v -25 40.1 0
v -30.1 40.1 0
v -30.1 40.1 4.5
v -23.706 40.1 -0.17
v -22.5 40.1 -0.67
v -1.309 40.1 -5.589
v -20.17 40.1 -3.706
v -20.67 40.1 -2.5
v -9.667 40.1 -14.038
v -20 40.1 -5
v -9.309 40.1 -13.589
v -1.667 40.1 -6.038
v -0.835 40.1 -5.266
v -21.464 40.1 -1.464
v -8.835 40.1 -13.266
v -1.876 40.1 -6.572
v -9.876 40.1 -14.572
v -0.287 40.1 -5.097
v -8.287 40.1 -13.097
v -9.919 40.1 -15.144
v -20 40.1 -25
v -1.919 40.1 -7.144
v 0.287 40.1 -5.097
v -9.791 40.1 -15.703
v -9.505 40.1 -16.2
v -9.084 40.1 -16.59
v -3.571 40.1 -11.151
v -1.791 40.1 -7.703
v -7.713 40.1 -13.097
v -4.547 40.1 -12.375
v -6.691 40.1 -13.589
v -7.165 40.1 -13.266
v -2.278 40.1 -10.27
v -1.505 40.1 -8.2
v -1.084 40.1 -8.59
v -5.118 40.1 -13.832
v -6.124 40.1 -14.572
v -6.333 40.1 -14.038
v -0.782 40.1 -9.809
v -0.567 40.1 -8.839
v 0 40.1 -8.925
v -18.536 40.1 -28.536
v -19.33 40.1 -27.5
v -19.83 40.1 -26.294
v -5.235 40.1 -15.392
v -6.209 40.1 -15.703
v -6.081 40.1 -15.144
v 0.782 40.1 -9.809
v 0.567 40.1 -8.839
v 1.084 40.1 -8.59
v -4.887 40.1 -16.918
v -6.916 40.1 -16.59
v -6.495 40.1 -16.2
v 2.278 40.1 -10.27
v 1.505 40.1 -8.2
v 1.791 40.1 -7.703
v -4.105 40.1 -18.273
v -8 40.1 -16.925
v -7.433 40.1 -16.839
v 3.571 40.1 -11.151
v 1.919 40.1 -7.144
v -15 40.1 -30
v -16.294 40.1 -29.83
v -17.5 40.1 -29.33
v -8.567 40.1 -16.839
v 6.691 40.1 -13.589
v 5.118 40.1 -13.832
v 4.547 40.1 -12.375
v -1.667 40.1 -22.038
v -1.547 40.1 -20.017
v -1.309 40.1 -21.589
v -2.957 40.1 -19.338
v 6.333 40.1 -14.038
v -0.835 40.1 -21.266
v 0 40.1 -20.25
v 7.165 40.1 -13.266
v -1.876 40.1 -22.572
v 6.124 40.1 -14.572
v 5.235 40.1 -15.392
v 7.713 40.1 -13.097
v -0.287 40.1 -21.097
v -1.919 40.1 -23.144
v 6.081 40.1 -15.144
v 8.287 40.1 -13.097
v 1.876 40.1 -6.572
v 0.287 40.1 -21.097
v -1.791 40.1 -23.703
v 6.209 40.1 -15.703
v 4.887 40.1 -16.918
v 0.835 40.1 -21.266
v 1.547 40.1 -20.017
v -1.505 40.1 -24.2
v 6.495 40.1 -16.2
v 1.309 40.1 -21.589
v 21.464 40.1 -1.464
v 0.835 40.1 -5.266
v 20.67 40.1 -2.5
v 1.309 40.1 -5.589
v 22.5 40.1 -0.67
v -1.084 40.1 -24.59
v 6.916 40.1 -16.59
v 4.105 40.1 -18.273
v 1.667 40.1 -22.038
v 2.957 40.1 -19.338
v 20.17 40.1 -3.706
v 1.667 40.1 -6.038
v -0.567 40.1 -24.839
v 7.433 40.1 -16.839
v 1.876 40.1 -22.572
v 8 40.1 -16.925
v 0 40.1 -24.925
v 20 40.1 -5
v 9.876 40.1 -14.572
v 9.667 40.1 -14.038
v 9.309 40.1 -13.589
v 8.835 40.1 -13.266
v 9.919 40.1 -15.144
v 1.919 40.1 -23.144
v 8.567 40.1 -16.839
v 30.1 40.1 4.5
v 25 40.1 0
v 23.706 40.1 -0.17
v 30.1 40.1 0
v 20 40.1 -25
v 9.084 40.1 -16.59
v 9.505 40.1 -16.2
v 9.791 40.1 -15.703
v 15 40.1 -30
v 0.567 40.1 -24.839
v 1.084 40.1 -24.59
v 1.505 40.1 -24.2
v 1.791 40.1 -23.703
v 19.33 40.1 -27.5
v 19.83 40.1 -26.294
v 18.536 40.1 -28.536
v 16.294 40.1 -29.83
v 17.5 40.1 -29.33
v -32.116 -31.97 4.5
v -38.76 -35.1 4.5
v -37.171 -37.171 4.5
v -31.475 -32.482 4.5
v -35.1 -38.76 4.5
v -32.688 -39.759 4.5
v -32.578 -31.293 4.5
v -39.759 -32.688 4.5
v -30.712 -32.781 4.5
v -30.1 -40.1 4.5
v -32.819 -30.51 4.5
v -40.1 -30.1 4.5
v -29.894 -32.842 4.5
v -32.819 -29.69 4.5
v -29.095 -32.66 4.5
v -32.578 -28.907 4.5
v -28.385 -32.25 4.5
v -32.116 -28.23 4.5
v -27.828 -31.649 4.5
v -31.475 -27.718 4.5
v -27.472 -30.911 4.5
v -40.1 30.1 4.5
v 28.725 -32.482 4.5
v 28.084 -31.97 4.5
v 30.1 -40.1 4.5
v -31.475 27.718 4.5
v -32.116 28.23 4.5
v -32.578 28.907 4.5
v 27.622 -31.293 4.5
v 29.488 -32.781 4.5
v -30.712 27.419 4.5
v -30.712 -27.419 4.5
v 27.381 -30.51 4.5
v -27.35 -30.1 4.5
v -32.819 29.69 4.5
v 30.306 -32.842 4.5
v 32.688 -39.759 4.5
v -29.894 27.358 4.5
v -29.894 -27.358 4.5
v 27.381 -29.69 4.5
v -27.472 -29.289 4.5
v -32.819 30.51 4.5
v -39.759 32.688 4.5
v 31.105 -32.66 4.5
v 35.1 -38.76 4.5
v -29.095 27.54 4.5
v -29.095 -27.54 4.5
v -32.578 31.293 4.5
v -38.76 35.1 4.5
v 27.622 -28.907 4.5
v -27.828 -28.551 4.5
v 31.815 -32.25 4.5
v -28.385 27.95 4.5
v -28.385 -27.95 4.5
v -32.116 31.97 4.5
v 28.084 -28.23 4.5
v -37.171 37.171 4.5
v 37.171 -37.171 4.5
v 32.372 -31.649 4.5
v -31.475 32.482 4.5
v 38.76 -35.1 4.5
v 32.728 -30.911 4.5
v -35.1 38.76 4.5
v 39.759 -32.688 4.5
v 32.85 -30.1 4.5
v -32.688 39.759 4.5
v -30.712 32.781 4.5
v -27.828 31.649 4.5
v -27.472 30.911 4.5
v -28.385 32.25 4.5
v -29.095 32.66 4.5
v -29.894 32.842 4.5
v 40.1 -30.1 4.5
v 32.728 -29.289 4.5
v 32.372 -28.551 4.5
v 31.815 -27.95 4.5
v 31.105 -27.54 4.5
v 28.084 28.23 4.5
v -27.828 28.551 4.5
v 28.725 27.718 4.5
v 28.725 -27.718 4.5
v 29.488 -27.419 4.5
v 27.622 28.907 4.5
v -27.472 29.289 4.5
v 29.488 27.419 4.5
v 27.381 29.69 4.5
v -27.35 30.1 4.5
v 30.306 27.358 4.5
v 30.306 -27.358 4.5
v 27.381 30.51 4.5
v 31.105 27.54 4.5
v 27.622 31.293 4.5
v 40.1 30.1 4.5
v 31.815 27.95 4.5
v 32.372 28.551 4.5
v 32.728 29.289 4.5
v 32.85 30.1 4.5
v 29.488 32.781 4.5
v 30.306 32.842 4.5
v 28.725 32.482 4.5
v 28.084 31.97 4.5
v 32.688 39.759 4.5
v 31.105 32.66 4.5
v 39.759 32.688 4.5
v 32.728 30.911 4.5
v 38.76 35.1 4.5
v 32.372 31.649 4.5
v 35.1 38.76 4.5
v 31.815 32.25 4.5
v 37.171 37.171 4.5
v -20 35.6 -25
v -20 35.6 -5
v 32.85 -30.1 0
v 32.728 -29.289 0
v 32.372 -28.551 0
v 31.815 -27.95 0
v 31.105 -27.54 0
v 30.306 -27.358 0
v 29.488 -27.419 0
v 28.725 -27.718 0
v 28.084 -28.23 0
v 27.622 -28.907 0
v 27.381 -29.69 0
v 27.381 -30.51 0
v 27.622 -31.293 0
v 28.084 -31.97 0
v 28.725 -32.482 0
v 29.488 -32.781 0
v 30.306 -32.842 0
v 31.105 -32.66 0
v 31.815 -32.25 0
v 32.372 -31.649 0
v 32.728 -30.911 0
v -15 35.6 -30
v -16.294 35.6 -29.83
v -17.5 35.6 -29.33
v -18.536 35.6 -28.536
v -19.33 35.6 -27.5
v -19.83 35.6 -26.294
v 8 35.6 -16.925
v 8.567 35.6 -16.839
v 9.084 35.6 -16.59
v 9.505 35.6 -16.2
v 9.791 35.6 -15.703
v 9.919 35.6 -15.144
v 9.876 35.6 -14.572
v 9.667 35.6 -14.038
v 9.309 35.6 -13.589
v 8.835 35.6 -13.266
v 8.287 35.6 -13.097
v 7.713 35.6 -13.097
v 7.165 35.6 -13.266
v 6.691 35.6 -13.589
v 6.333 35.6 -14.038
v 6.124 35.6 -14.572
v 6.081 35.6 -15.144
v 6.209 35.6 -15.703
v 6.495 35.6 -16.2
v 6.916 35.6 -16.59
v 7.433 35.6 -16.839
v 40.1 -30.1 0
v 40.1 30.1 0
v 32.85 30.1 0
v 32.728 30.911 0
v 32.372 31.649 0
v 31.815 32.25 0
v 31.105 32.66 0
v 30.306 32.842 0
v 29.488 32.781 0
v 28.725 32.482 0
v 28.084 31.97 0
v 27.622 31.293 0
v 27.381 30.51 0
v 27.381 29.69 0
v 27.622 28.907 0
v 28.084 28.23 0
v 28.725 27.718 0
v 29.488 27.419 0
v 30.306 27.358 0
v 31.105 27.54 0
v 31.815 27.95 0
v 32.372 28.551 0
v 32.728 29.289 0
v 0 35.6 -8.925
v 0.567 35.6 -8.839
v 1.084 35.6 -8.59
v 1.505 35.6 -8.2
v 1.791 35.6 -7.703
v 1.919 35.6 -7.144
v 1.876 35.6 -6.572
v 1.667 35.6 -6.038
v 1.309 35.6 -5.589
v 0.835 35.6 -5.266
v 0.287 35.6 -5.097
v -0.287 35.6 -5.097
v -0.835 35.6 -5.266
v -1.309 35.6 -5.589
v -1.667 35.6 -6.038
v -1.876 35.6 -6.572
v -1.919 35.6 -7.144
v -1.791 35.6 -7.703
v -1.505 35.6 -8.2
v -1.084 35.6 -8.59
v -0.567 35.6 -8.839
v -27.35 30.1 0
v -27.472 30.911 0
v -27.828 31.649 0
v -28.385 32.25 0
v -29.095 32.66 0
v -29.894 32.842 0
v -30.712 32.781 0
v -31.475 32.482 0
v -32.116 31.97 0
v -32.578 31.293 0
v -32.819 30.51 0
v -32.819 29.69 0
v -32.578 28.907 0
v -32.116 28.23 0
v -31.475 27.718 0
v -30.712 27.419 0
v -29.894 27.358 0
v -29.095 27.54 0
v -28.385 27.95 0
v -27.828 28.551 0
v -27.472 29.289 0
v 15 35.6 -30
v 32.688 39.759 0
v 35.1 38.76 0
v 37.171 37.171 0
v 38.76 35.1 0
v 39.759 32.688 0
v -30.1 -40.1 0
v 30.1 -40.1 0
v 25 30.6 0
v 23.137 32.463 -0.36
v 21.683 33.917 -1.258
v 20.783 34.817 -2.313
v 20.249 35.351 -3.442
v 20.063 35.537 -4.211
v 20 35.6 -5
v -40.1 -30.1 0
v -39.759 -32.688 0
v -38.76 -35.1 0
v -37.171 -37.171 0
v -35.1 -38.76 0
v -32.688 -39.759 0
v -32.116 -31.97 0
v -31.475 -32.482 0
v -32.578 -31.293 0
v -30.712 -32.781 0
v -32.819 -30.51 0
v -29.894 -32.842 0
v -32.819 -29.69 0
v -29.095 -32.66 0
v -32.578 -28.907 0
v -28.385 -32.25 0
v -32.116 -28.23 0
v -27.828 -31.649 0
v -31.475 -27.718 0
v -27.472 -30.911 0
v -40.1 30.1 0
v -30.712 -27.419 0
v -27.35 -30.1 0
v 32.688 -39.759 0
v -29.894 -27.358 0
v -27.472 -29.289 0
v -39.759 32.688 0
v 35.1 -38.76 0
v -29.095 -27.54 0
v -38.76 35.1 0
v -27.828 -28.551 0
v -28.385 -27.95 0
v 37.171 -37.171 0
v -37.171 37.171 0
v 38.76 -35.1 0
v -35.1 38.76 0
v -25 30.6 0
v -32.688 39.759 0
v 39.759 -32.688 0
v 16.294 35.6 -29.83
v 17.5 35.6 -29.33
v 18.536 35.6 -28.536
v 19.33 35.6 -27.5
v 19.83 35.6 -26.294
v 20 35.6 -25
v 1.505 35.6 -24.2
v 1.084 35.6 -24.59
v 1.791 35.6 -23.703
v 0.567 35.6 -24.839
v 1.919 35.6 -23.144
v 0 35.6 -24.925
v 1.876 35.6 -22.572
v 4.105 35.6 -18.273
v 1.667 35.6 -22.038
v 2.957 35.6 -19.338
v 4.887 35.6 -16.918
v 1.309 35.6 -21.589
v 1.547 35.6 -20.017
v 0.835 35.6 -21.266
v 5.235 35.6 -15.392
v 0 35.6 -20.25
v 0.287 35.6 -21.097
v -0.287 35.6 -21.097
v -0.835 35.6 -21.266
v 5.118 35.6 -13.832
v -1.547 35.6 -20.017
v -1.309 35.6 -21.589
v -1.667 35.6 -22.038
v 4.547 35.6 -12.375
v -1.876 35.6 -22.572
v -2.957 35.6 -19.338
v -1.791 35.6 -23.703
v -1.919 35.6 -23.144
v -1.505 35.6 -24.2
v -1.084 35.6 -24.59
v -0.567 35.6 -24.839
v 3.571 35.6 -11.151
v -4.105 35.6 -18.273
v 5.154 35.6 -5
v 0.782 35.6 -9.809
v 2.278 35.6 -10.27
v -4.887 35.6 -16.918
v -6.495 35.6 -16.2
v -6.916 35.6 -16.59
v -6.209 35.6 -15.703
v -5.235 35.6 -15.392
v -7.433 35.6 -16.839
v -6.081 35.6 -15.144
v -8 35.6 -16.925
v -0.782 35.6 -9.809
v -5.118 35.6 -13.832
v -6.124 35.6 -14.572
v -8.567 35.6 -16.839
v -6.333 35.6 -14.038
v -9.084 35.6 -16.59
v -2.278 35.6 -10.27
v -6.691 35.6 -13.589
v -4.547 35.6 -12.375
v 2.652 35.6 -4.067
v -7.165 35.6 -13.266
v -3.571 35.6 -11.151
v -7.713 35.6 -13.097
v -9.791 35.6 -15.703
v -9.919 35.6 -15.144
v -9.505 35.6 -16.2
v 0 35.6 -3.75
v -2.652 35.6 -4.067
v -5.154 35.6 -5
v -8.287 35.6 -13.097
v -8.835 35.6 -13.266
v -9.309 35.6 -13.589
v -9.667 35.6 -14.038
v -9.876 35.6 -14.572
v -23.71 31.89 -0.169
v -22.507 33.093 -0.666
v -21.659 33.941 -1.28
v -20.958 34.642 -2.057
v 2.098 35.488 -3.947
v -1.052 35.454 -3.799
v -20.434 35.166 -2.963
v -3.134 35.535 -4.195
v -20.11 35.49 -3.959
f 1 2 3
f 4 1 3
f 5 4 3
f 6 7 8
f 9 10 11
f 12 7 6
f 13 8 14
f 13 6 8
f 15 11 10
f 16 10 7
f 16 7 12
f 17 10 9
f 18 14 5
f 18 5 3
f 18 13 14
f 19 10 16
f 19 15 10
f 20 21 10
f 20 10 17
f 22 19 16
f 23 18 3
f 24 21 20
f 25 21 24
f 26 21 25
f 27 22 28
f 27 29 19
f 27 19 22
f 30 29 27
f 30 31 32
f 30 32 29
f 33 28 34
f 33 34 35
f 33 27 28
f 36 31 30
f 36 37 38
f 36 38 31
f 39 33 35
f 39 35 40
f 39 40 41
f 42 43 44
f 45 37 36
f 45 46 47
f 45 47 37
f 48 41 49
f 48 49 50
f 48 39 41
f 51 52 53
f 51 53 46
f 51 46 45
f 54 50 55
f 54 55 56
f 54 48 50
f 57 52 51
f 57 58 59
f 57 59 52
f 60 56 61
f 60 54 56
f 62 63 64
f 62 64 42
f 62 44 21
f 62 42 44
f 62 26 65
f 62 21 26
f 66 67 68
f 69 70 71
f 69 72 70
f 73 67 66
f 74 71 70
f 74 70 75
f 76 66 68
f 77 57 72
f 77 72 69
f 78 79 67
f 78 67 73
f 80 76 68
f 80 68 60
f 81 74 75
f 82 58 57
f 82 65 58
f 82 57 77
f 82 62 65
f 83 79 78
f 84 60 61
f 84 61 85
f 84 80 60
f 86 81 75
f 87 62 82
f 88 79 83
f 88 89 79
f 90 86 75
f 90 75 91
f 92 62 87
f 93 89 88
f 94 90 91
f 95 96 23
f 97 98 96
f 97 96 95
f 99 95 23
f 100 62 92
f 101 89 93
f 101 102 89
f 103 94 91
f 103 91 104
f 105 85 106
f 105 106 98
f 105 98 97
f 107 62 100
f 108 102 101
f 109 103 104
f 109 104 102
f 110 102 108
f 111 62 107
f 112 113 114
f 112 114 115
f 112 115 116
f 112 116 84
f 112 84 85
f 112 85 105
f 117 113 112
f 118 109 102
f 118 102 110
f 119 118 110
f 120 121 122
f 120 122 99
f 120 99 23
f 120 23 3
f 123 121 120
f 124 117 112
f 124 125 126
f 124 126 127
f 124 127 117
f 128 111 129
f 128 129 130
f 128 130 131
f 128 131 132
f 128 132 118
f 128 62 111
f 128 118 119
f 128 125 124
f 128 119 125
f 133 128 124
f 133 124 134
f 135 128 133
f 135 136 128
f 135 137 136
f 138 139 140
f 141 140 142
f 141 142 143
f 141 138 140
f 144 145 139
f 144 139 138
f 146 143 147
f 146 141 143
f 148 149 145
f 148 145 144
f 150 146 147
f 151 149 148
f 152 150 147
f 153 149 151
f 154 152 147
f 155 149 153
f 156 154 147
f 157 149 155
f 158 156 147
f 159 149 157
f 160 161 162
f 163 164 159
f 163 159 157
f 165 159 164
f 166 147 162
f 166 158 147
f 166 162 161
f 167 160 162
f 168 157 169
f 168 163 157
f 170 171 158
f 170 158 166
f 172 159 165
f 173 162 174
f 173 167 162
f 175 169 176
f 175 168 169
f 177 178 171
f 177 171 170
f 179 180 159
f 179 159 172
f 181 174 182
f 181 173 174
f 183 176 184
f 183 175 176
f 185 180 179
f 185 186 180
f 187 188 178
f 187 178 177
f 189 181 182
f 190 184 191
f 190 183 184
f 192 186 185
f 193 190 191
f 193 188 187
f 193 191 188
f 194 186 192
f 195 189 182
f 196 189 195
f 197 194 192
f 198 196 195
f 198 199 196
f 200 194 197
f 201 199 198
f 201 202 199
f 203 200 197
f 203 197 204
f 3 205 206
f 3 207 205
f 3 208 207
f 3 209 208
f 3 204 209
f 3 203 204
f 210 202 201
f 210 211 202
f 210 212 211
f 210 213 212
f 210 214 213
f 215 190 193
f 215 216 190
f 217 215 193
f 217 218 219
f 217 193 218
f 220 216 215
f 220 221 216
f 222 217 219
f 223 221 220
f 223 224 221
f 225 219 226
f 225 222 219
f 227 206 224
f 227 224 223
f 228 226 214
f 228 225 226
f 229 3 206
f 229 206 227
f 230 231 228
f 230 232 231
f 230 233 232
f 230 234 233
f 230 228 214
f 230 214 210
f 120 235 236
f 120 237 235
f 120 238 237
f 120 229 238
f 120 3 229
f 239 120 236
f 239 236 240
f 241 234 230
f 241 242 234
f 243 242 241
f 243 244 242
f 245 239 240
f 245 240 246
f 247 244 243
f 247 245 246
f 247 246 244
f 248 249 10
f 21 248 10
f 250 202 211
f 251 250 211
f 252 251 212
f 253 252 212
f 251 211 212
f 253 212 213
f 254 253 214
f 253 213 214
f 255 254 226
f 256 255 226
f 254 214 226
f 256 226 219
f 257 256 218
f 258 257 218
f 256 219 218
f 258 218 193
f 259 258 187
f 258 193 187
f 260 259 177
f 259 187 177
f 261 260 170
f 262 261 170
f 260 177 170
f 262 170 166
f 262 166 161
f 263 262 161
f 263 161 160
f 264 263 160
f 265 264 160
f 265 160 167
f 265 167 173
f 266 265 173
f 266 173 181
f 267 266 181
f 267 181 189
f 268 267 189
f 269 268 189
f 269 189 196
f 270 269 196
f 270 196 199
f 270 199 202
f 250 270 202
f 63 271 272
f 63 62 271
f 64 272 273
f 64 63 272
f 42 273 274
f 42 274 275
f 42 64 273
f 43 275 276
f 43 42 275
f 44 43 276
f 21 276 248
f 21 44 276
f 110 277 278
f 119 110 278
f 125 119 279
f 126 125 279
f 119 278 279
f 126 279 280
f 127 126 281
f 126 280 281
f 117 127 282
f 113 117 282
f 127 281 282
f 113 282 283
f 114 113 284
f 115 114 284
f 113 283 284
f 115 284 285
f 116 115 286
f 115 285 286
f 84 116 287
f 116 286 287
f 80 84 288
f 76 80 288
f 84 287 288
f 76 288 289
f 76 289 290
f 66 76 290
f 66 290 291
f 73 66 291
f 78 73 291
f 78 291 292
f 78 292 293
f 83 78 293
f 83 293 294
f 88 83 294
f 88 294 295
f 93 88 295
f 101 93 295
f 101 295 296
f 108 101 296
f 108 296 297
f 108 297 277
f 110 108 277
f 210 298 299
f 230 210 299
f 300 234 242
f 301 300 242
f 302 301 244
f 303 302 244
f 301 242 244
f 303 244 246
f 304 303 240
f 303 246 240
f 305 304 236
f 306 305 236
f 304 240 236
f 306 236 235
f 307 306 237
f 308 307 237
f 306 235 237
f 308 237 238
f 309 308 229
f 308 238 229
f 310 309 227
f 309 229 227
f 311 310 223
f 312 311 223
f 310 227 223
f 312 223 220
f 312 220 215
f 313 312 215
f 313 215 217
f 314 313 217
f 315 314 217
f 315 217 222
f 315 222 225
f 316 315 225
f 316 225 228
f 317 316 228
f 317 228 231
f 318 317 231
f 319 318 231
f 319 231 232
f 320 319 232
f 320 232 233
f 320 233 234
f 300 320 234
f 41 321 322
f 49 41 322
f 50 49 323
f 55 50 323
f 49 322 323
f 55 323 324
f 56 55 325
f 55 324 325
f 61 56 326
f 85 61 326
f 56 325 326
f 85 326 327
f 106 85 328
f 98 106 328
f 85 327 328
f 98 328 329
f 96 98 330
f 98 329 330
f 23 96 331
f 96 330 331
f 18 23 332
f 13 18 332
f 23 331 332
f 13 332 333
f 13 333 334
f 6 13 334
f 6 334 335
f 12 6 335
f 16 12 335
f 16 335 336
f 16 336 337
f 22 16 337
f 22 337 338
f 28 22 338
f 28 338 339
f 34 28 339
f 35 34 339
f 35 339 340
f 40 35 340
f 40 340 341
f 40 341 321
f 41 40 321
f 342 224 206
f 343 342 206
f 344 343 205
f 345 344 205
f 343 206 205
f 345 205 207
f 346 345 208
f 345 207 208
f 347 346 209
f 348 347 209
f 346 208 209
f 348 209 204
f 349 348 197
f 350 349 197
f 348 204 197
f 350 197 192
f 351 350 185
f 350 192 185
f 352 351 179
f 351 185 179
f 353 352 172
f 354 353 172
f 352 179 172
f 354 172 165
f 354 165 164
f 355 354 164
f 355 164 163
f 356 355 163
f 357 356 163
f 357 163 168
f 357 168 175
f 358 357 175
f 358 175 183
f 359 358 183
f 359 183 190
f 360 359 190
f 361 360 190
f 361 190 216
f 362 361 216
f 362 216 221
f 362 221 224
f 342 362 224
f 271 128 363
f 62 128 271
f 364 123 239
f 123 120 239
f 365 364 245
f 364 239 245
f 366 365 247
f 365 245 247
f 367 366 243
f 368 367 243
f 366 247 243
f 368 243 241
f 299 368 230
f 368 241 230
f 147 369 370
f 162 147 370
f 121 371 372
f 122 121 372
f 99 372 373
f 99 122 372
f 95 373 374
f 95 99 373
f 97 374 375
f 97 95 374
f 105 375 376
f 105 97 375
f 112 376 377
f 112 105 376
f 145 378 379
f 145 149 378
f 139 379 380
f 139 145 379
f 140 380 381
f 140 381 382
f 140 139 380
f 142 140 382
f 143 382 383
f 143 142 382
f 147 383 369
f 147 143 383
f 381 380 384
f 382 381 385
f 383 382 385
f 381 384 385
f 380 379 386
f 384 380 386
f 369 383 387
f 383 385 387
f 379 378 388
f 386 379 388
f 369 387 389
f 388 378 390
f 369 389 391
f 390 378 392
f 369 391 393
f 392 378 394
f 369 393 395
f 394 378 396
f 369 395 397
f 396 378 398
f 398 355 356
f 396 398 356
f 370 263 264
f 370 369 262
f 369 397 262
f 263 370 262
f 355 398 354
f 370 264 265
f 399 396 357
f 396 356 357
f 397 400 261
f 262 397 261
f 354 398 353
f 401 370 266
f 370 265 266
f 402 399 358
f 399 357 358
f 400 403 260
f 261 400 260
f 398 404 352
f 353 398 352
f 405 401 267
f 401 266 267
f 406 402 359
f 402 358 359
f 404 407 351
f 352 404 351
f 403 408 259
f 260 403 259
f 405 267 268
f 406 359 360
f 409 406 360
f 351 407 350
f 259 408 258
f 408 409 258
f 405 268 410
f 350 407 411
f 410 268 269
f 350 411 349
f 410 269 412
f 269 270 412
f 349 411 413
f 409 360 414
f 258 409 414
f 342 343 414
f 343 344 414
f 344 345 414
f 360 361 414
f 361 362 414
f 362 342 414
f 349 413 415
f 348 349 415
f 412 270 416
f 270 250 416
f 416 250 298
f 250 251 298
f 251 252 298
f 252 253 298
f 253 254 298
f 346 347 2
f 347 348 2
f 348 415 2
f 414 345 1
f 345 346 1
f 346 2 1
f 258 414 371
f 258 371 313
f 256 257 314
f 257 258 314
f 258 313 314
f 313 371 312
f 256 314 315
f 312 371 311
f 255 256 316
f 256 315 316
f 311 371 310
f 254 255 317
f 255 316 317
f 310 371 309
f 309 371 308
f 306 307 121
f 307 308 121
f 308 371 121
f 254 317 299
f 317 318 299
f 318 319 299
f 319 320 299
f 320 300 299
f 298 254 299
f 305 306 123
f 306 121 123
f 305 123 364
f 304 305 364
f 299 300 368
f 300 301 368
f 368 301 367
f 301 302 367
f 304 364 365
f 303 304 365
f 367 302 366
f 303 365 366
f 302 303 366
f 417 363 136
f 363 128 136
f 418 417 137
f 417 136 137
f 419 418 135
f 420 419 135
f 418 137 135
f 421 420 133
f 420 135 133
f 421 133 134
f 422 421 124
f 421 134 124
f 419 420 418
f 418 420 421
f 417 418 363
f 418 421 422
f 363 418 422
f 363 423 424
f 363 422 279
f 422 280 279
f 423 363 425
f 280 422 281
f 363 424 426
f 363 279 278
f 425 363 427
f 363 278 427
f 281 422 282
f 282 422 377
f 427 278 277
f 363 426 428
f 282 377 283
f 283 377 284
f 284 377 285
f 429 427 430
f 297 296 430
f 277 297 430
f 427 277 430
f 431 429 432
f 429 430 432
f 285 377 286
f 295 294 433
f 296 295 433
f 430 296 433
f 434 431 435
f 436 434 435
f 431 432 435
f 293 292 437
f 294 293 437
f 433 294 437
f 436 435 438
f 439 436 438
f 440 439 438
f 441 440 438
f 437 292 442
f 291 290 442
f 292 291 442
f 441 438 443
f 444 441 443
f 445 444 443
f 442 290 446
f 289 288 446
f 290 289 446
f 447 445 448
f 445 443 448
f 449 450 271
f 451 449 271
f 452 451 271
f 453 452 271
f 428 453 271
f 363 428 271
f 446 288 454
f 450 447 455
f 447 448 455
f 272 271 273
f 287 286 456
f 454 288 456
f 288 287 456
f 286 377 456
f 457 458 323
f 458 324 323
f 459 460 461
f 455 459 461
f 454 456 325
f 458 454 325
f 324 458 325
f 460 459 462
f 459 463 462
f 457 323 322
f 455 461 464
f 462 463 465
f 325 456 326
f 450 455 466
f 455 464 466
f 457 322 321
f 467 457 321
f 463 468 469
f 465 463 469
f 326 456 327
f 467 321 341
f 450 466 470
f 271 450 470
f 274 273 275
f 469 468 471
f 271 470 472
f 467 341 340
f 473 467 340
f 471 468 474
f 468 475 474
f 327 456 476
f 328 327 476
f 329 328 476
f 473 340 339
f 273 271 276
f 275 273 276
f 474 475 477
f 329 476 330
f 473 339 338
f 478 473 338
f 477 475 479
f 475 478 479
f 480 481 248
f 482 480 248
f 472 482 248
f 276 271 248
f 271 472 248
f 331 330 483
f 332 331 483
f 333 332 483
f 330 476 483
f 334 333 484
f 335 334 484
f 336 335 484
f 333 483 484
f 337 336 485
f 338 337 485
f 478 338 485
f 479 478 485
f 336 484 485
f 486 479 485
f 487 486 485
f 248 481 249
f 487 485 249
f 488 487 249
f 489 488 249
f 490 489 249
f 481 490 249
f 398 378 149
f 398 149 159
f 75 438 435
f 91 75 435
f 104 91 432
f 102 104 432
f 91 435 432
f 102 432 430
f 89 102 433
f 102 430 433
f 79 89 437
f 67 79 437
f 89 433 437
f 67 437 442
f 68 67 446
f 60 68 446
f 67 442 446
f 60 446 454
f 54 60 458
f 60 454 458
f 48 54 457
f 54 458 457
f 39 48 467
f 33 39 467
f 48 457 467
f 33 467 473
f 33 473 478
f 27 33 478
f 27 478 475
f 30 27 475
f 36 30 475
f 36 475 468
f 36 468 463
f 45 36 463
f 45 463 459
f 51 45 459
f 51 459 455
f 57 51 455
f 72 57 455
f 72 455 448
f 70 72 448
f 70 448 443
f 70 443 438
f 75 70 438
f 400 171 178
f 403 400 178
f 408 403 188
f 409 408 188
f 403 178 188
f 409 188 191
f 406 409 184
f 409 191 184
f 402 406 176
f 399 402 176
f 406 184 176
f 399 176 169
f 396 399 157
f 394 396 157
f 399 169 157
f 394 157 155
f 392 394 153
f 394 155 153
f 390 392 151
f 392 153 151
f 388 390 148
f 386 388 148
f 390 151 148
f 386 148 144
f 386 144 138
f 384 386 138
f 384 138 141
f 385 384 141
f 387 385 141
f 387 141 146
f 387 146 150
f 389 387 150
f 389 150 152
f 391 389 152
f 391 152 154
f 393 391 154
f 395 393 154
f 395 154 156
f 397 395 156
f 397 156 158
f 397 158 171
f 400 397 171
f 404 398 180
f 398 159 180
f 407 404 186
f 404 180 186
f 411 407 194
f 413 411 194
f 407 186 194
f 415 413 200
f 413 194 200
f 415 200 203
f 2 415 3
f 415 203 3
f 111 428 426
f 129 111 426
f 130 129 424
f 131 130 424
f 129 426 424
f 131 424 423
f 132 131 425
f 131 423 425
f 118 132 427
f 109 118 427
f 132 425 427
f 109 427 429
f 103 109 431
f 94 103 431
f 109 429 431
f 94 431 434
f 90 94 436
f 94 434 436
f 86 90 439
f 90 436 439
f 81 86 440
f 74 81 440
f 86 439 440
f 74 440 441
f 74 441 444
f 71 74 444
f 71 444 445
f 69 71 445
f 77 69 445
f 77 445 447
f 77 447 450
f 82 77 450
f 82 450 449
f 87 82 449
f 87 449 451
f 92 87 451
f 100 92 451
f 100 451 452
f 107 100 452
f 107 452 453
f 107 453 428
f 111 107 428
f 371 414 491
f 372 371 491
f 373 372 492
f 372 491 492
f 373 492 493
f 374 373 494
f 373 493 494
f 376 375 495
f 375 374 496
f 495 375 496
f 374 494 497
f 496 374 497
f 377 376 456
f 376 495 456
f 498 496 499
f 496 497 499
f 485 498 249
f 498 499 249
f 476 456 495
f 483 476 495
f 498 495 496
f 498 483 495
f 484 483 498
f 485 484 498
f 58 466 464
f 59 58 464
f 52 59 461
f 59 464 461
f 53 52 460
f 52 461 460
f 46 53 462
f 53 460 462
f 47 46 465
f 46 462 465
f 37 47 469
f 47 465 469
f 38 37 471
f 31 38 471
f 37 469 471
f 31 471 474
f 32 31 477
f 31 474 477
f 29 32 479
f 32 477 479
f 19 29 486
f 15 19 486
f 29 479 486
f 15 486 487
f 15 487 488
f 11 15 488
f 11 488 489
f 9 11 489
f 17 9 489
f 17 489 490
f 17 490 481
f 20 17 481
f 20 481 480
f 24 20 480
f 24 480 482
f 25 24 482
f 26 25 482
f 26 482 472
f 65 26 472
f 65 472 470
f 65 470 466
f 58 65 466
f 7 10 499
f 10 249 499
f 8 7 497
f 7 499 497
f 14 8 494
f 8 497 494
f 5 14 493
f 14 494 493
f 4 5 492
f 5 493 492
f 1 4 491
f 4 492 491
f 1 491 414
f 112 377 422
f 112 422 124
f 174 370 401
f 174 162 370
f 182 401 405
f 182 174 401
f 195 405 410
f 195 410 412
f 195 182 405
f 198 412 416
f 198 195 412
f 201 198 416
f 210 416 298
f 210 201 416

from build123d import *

# Parameters (mm, degrees)
SKETCH1_W            = 80.2
SKETCH1_H            = 80.2
BOSS_EXTRUDE1_DEPTH  = 4.5
M5_CLEARANCE_HOLE1_D = 5.5
SKETCH3_W            = 40
SKETCH3_H            = 4.5
BOSS_EXTRUDE2_DEPTH  = 30
CUT_EXTRUDE1_REACH   = 92.766
SKETCH4_R            = 5.25
CUT_EXTRUDE2_REACH   = 92.766
SKETCH5_R            = 1.924517265
FILLET2_R            = 10
FILLET4_R            = 5
FILLET3_R            = 5
CUT_EXTRUDE3_REACH   = 92.766
SKETCH6_R            = 11.25
FILLET5_R            = 5


with BuildPart() as part:
    # Sketch1 → Boss-Extrude1 (new body)
    with BuildSketch(Plane.XY):
        Rectangle(SKETCH1_W, SKETCH1_H)
    extrude(amount=BOSS_EXTRUDE1_DEPTH)

    # M5 Clearance Hole1 (through all)
    with Locations(Plane(origin=(-30.1, -30.1, 0), x_dir=(-1, 0, 0), z_dir=(0, 0, -1))):
        with Locations((0, 0), (-60.2, 60.2), (0, 60.2), (-60.2, 0)):
            Hole(M5_CLEARANCE_HOLE1_D / 2)

    # Sketch3 → Boss-Extrude2 (add)
    with BuildSketch(Plane(origin=(0, 0, 0), x_dir=(-1, 0, 0), z_dir=(0, 0, -1))):
        with Locations((0, 37.85)):
            Rectangle(SKETCH3_W, SKETCH3_H)
    extrude(amount=BOSS_EXTRUDE2_DEPTH)

    # Sketch4 → Cut-Extrude1 (cut, up to next)
    with BuildSketch(Plane(origin=(0, 35.6, 0), x_dir=(-1, 0, 0), z_dir=(0, -1, 0)), mode=Mode.PRIVATE) as cut_extrude1_sk1:
        with Locations(Location((0, 15, 0), (0, 0, 90))):
            Circle(SKETCH4_R)
    cut_extrude1_tool1 = extrude(cut_extrude1_sk1.sketch, amount=-CUT_EXTRUDE1_REACH, mode=Mode.PRIVATE) & part.part
    add(cut_extrude1_tool1.solids().sort_by_distance((0, 35.6, -15))[0], mode=Mode.SUBTRACT)

    # Sketch5 → Cut-Extrude2 (cut, up to next)
    with BuildSketch(Plane.XZ.offset(-35.6), mode=Mode.PRIVATE) as cut_extrude2_sk1:
        with Locations(Location((0, -23, 0), (0, 0, 270))):
            Circle(SKETCH5_R)
    cut_extrude2_tool1 = extrude(cut_extrude2_sk1.sketch, amount=-CUT_EXTRUDE2_REACH, mode=Mode.PRIVATE) & part.part
    # Sketch5 → Cut-Extrude2 (cut, up to next)
    with BuildSketch(Plane.XZ.offset(-35.6), mode=Mode.PRIVATE) as cut_extrude2_sk2:
        with Locations(Location((-8, -15, 0), (0, 0, 270))):
            Circle(SKETCH5_R)
    cut_extrude2_tool2 = extrude(cut_extrude2_sk2.sketch, amount=-CUT_EXTRUDE2_REACH, mode=Mode.PRIVATE) & part.part
    # Sketch5 → Cut-Extrude2 (cut, up to next)
    with BuildSketch(Plane.XZ.offset(-35.6), mode=Mode.PRIVATE) as cut_extrude2_sk3:
        with Locations(Location((0, -7, 0), (0, 0, 270))):
            Circle(SKETCH5_R)
    cut_extrude2_tool3 = extrude(cut_extrude2_sk3.sketch, amount=-CUT_EXTRUDE2_REACH, mode=Mode.PRIVATE) & part.part
    # Sketch5 → Cut-Extrude2 (cut, up to next)
    with BuildSketch(Plane.XZ.offset(-35.6), mode=Mode.PRIVATE) as cut_extrude2_sk4:
        with Locations(Location((8, -15, 0), (0, 0, 270))):
            Circle(SKETCH5_R)
    cut_extrude2_tool4 = extrude(cut_extrude2_sk4.sketch, amount=-CUT_EXTRUDE2_REACH, mode=Mode.PRIVATE) & part.part
    add(cut_extrude2_tool1.solids().sort_by_distance((0, 35.6, -23))[0], mode=Mode.SUBTRACT)
    add(cut_extrude2_tool2.solids().sort_by_distance((-8, 35.6, -15))[0], mode=Mode.SUBTRACT)
    add(cut_extrude2_tool3.solids().sort_by_distance((0, 35.6, -7))[0], mode=Mode.SUBTRACT)
    add(cut_extrude2_tool4.solids().sort_by_distance((8, 35.6, -15))[0], mode=Mode.SUBTRACT)

    # Fillet2
    fillet2_edges = [part.edges().sort_by_distance(p)[0] for p in [
        (40.1, -40.1, 2.25),
        (-40.1, -40.1, 2.25),
        (-40.1, 40.1, 2.25),
        (40.1, 40.1, 2.25),
    ]]
    fillet(fillet2_edges, radius=FILLET2_R)

    # Fillet4
    fillet4_edges = [part.edges().sort_by_distance(p)[0] for p in [
        (0, 35.6, 0),
    ]]
    fillet(fillet4_edges, radius=FILLET4_R)

    # Fillet3
    fillet3_edges = [part.edges().sort_by_distance(p)[0] for p in [
        (-20, 37.85, -30),
        (20, 37.85, -30),
    ]]
    fillet(fillet3_edges, radius=FILLET3_R)

    # Sketch6 → Cut-Extrude3 (cut, up to next)
    with BuildSketch(Plane.XZ.offset(-35.6), mode=Mode.PRIVATE) as cut_extrude3_sk1:
        with Locations((0, -15)):
            Circle(SKETCH6_R)
    cut_extrude3_tool1 = extrude(cut_extrude3_sk1.sketch, amount=CUT_EXTRUDE3_REACH, mode=Mode.PRIVATE) & part.part
    add(cut_extrude3_tool1.solids().sort_by_distance((0, 35.6, -15))[0], mode=Mode.SUBTRACT)

    # Fillet5
    fillet5_edges = [part.edges().sort_by_distance(p)[0] for p in [
        (-20, 35.35, 0),
        (20, 35.35, 0),
    ]]
    fillet(fillet5_edges, radius=FILLET5_R)


solid = part.part
